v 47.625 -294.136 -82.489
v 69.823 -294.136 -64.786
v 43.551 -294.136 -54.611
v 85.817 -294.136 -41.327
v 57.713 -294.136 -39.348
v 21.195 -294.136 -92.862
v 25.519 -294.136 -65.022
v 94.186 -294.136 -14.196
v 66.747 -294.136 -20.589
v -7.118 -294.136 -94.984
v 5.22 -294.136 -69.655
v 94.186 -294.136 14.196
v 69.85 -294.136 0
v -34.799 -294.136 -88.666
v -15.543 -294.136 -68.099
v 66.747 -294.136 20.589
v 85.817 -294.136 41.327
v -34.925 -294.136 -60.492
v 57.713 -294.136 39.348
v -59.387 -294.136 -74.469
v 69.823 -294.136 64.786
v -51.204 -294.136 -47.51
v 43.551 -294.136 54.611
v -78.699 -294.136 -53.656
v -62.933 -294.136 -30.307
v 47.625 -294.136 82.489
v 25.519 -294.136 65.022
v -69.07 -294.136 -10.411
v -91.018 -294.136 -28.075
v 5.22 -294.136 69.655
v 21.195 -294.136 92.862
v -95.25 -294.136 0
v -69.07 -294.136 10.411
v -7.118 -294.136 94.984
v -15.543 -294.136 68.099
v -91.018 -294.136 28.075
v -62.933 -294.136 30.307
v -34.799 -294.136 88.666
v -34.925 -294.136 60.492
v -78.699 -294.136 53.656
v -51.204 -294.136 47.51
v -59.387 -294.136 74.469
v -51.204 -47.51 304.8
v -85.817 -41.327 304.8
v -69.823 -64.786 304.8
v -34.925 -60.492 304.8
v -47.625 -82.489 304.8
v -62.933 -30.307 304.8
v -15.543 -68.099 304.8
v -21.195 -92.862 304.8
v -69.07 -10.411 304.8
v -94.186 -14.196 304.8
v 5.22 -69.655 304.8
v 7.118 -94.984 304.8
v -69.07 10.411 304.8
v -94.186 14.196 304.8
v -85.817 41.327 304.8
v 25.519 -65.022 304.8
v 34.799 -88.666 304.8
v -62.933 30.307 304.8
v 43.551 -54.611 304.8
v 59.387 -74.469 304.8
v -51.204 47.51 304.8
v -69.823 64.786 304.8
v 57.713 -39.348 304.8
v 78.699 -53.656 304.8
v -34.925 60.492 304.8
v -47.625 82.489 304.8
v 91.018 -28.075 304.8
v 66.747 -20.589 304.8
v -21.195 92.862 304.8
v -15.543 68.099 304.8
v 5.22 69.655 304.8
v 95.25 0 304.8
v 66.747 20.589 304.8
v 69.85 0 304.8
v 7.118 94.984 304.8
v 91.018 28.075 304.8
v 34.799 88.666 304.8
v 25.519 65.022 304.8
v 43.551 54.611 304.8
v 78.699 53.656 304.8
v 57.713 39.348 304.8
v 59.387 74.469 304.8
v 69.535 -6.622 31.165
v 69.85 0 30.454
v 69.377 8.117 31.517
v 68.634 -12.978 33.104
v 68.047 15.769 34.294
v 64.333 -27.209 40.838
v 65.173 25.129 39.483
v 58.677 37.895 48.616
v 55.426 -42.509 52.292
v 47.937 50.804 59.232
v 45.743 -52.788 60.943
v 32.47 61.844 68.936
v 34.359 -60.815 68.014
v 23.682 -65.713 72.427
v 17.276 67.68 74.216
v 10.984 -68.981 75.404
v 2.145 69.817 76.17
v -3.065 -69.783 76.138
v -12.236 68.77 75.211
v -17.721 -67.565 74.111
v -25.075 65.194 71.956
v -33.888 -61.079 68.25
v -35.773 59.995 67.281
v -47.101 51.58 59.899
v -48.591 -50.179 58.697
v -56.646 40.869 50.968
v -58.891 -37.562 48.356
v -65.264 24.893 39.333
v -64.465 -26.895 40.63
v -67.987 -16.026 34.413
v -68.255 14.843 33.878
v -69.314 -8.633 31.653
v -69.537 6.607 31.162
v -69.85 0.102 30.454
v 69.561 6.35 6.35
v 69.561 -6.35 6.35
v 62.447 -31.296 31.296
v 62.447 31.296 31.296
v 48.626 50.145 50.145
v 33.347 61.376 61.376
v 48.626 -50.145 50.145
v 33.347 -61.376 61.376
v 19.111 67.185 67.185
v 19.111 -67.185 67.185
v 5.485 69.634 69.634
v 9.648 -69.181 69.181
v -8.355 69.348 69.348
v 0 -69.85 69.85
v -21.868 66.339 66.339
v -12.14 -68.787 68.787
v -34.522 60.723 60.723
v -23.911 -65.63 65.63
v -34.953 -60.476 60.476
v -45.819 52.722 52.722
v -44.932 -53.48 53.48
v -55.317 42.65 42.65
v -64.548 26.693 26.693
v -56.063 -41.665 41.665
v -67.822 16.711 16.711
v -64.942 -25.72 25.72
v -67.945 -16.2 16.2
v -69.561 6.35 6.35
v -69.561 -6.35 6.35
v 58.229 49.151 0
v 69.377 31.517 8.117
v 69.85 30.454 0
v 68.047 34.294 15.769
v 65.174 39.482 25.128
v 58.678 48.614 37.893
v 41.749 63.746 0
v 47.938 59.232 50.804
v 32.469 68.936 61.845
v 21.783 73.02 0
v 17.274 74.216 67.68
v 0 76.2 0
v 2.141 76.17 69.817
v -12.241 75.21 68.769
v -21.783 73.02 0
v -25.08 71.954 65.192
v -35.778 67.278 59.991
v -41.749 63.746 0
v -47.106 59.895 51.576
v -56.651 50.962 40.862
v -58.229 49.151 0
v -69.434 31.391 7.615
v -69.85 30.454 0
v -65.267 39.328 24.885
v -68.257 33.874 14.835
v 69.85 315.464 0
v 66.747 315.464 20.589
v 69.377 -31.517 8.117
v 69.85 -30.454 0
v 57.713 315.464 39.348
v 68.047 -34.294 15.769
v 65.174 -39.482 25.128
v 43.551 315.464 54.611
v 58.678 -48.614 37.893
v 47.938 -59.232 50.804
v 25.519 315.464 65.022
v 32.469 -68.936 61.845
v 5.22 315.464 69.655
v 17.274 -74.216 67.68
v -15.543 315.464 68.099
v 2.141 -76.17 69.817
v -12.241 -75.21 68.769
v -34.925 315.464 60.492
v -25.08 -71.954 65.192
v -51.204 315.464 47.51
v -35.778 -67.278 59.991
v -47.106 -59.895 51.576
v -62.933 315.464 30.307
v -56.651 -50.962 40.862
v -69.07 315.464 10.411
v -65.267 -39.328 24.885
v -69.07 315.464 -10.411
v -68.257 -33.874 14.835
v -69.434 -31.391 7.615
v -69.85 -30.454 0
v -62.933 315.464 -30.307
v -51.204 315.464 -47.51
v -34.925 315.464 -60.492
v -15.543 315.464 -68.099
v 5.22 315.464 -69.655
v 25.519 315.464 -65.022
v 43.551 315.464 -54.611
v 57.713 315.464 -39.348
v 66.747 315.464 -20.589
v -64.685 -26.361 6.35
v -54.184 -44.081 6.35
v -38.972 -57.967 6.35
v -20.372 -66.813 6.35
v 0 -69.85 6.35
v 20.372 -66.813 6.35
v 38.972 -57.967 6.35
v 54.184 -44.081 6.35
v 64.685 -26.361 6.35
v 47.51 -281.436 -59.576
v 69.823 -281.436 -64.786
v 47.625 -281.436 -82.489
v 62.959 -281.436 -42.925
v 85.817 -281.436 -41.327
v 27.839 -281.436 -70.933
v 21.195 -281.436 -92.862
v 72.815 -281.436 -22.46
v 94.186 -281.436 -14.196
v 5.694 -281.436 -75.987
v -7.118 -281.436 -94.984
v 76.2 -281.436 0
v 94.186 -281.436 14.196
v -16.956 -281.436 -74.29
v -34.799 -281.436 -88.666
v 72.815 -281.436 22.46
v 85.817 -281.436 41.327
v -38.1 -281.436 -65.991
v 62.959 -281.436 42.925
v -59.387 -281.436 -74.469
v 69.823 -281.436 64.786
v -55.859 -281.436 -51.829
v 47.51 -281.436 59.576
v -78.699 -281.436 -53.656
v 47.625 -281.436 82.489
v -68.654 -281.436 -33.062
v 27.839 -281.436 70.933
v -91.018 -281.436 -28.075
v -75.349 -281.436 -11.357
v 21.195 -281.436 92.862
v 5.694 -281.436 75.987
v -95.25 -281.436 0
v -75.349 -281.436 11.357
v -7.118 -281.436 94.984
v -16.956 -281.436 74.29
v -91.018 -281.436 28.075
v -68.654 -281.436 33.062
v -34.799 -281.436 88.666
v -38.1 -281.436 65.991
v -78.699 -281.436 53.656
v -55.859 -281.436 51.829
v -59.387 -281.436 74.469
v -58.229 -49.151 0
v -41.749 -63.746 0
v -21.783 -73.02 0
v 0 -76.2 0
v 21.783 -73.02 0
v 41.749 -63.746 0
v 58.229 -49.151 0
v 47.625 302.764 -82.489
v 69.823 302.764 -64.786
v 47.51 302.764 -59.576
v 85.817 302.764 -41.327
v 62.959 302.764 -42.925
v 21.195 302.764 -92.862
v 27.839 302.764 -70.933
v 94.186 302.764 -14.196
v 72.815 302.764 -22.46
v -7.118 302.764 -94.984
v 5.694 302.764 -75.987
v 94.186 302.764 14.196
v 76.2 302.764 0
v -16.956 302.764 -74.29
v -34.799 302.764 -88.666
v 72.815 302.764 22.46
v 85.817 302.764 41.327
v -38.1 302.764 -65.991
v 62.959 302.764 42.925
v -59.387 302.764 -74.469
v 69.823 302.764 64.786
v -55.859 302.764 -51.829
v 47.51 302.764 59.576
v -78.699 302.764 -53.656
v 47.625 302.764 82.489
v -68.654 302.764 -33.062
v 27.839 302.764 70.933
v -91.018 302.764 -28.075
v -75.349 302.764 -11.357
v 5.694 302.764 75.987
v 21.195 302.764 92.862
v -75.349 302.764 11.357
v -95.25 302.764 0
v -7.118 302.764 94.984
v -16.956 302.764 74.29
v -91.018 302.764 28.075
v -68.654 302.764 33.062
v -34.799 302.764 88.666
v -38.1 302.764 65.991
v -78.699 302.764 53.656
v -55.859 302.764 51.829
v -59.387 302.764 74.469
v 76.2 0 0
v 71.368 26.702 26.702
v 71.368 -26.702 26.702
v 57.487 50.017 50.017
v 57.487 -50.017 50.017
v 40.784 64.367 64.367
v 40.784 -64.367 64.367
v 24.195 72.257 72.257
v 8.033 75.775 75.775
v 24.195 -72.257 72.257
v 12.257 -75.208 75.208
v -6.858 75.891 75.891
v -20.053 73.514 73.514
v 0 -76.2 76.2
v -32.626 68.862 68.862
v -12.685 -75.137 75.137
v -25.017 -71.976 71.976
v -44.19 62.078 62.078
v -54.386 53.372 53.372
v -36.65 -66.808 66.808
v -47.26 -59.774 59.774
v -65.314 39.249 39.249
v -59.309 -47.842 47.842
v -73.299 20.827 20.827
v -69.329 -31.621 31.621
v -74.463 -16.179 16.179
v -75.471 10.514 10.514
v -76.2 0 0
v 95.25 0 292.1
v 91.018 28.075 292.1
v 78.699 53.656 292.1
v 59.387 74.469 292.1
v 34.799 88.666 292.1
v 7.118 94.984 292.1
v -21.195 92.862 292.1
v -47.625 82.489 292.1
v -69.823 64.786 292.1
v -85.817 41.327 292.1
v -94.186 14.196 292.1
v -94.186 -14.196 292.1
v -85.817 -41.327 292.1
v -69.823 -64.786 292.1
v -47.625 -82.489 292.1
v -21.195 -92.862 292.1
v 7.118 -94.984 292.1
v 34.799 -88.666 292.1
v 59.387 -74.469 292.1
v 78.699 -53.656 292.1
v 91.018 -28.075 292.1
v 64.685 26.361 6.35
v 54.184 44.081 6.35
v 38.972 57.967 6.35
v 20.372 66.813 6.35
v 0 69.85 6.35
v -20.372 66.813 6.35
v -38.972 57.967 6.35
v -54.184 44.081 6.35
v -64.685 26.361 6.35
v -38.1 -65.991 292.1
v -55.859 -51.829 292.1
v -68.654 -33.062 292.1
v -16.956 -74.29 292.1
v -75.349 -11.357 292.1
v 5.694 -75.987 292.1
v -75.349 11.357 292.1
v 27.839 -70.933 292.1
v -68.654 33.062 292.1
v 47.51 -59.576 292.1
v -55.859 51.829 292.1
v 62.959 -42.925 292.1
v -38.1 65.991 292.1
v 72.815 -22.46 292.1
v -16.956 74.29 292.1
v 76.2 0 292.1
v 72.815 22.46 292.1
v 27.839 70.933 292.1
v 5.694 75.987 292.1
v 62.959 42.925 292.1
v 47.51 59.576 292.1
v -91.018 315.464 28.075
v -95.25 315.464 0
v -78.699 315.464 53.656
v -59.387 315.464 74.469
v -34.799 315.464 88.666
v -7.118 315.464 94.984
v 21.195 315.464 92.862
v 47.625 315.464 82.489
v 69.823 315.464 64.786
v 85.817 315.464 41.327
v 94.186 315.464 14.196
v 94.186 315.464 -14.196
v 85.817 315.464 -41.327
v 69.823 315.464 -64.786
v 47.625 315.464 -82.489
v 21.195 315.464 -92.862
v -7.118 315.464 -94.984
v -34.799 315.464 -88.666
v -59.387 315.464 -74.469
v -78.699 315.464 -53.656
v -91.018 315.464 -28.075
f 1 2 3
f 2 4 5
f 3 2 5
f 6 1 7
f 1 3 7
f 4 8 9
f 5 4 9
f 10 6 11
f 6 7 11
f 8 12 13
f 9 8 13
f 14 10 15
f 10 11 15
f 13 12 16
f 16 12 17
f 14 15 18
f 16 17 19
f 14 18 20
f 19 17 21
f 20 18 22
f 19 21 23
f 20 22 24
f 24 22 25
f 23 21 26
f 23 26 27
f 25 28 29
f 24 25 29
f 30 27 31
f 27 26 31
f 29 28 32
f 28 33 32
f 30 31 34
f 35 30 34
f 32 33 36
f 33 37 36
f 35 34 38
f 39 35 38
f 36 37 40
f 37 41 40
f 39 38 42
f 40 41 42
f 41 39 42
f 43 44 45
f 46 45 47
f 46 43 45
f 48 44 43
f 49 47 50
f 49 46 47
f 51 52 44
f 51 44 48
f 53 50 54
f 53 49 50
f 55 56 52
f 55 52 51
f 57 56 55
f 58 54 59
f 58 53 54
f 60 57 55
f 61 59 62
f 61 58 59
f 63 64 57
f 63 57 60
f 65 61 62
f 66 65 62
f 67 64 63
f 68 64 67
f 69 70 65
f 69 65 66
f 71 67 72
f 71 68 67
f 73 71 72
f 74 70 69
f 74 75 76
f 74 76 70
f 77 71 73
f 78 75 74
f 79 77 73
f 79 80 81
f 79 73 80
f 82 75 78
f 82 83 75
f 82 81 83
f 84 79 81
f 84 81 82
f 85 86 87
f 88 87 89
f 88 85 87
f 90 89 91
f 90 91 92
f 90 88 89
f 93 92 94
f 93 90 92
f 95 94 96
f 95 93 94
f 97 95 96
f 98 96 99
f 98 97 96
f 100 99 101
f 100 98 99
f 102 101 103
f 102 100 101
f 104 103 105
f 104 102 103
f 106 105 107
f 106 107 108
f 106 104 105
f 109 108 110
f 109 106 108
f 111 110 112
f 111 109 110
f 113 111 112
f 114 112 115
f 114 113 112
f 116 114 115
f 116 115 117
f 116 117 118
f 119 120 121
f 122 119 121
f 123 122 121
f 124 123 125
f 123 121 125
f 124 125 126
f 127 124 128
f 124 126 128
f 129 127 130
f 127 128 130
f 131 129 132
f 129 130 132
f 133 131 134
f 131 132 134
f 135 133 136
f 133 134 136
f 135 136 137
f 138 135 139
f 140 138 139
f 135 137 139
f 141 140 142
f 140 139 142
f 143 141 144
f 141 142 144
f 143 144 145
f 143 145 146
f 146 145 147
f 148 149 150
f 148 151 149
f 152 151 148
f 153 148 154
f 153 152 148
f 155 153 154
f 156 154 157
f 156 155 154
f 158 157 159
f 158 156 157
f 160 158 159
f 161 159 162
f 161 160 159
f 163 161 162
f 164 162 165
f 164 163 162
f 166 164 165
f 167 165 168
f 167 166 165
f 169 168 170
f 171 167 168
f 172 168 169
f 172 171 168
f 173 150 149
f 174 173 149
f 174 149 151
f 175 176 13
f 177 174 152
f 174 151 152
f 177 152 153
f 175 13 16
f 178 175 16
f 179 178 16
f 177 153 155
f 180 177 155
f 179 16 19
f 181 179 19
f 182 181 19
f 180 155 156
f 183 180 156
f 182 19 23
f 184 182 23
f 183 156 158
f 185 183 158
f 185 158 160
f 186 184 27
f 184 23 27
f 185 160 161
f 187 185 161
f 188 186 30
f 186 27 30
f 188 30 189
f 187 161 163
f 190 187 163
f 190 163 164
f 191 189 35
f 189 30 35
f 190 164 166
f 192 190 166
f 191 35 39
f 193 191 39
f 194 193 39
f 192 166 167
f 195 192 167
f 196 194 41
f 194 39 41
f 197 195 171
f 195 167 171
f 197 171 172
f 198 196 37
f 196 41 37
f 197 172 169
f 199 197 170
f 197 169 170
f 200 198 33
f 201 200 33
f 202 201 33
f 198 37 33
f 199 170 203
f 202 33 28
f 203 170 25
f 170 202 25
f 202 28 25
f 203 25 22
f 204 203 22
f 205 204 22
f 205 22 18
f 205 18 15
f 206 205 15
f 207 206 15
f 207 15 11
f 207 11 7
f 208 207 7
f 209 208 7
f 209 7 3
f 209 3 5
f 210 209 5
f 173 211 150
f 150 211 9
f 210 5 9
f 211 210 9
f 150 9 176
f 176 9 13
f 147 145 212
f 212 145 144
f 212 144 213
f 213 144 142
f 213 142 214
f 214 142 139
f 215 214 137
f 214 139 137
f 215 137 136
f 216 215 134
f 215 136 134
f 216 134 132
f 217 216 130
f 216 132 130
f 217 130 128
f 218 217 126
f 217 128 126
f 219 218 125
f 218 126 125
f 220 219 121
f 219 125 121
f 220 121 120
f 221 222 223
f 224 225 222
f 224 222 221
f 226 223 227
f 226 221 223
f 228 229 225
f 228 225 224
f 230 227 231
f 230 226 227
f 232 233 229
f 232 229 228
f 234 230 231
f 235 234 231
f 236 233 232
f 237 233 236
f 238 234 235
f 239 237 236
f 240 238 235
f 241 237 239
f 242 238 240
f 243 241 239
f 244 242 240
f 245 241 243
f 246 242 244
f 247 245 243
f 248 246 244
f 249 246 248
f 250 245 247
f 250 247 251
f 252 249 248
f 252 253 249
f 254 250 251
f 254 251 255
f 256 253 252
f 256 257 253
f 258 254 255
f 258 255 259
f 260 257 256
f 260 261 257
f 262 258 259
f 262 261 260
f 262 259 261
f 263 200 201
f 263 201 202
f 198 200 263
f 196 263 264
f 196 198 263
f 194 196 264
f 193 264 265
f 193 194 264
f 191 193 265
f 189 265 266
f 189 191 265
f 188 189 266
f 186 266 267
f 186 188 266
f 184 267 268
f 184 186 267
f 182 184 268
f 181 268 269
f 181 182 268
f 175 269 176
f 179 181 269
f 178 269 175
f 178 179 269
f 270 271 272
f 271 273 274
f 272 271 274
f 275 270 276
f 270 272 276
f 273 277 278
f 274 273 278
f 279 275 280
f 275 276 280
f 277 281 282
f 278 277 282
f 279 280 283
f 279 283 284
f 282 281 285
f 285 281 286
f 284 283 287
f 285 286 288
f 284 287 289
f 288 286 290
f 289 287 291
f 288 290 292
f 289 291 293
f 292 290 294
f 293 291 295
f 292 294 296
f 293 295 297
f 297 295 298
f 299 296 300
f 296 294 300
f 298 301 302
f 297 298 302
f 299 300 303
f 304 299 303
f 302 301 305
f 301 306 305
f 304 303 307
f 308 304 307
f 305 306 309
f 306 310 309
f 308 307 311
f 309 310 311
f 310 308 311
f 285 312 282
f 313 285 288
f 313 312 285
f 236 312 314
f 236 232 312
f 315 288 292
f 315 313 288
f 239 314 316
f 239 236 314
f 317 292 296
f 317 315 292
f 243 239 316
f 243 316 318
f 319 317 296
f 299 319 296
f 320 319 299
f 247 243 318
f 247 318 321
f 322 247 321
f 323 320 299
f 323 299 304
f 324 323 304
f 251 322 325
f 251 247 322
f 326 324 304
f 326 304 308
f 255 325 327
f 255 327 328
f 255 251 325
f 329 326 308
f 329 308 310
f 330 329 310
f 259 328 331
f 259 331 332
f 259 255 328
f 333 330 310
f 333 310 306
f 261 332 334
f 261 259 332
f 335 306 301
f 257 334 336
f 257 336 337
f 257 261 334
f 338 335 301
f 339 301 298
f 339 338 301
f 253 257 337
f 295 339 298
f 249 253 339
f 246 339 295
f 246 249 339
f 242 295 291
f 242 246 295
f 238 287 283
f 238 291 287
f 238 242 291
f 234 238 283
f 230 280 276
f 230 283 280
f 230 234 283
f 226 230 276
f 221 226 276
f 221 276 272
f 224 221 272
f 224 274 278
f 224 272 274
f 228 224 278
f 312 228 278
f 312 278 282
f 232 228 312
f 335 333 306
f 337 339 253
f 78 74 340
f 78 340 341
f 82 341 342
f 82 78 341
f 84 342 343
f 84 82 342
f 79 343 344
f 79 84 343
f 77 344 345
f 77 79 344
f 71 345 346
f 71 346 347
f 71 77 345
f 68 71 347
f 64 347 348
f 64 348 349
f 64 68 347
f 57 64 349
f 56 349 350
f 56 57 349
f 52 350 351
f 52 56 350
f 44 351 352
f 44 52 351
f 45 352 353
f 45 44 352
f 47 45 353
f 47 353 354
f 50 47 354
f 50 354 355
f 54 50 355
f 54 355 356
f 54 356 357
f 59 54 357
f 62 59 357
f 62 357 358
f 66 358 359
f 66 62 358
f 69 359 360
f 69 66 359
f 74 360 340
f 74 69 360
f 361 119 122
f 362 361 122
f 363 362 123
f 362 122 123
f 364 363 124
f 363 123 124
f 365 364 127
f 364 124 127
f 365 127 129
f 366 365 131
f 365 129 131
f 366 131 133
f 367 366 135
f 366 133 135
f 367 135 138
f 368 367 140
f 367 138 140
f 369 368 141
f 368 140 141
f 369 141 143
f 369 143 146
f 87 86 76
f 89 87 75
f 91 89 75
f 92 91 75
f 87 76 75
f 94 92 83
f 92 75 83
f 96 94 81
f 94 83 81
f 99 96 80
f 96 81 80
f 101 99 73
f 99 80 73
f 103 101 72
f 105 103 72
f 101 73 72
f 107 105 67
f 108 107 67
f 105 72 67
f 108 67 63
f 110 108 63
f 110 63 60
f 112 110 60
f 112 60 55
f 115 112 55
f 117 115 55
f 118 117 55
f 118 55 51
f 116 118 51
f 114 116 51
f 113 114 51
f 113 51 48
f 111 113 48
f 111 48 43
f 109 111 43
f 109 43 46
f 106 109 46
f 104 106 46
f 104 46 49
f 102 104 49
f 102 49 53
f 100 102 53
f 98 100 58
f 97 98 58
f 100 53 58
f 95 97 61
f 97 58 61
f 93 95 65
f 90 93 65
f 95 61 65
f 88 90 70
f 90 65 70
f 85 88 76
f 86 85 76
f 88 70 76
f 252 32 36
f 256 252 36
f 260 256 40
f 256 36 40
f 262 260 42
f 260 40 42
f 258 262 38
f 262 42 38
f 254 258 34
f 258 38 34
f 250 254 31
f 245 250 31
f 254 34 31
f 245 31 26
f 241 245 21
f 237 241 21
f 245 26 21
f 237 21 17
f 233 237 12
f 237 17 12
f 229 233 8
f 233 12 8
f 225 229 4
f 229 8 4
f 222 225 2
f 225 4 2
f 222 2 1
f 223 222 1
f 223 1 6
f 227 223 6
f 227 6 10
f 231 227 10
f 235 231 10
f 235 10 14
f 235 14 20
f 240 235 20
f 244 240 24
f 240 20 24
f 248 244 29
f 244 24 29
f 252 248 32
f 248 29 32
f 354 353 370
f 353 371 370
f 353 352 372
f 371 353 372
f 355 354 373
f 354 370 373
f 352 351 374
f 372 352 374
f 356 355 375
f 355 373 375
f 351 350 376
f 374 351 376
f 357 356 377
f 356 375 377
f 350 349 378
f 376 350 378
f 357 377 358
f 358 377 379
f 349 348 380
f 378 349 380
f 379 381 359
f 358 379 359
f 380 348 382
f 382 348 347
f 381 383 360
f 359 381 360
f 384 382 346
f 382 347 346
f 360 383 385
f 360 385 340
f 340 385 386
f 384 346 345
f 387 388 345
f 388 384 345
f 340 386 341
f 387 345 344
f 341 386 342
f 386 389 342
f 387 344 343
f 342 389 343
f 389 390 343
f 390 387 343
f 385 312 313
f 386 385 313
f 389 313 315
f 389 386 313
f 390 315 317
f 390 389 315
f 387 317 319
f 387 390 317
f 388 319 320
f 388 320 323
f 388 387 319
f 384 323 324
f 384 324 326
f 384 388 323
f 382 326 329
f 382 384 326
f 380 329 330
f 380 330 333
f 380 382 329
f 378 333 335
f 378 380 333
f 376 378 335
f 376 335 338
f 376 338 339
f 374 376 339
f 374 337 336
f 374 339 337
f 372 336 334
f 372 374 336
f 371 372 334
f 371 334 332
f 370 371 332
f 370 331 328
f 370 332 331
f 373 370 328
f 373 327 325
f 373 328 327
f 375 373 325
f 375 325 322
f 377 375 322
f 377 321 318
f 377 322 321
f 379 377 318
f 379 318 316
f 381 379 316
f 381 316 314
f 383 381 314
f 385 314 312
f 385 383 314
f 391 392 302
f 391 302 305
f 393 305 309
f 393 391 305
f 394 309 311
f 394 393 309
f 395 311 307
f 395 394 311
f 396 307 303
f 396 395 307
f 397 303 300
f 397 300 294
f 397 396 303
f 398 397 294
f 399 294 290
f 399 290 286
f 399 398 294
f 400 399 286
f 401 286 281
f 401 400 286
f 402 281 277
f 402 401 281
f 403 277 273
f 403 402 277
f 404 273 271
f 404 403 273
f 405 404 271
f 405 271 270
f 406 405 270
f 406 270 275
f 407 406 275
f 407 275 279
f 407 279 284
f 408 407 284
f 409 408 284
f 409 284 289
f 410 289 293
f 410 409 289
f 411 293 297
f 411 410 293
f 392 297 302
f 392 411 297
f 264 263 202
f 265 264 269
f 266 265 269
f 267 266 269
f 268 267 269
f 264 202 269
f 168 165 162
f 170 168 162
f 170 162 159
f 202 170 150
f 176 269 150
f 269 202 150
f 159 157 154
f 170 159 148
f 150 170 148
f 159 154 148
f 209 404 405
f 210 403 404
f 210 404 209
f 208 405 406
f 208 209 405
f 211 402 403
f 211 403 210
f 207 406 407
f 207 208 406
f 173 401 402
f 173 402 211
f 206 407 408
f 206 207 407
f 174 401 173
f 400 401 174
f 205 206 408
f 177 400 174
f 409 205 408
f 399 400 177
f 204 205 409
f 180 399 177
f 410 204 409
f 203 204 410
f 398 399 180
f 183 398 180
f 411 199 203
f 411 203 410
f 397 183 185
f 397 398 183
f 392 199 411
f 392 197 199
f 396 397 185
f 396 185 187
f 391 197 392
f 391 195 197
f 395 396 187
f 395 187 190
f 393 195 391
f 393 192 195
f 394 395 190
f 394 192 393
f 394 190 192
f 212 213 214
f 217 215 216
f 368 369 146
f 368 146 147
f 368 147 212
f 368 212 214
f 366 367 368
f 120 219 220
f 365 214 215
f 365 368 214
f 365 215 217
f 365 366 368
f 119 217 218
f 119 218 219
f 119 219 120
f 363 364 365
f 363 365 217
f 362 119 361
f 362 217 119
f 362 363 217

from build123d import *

# Parameters (mm, degrees)
F2_R      = 76.2
F5_DEPTH  = 609.6
F4_R      = 76.2
F6_DEPTH  = 304.8
F7_T      = -6.35
F7_2_T    = -6.35
F9_R      = 95.25
F9_R_2    = 76.2
F10_DEPTH = 12.7
F12_R     = 95.25
F12_R_2   = 76.2
F13_DEPTH = 12.7
F14_R     = 95.25
F14_R_2   = 76.2
F15_DEPTH = 12.7


with BuildPart() as f5:
    # F2 (on plane+point) → F5 (new body)
    with BuildSketch(Plane.XZ.offset(294.1361665726)):
        Circle(F2_R)
    extrude(amount=-F5_DEPTH)

    # F7
    f7_openings = [f5.faces().sort_by_distance(p)[0] for p in [
        (0, 315.463833, 0),
        (0, -294.136167, 0),
    ]]
    offset(amount=F7_T, openings=f7_openings)

    # F9 (on line) → F10 (join)
    with BuildSketch(Plane(origin=(0, -294.1361665726, 0), x_dir=(-1, 0, 0), z_dir=(0, 1, 0))):
        Circle(F9_R)
        Circle(F9_R_2, mode=Mode.SUBTRACT)
    extrude(amount=F10_DEPTH)

    # F12 (on line) → F13 (join)
    with BuildSketch(Plane(origin=(0, 315.4638334274, 0), x_dir=(-1, 0, 0), z_dir=(0, 1, 0))):
        Circle(F12_R)
        Circle(F12_R_2, mode=Mode.SUBTRACT)
    extrude(amount=-F13_DEPTH)



with BuildPart() as f6:
    # F4 (on plane+point) → F6 (new body)
    with BuildSketch(Plane.XY.offset(304.8)):
        Circle(F4_R)
    extrude(amount=-F6_DEPTH)

    # F7#2
    f7_2_openings = [f6.faces().sort_by_distance(p)[0] for p in [
        (0, 0, 304.8),
    ]]
    offset(amount=F7_2_T, openings=f7_2_openings)


with BuildPart() as f5_1:
    add(f5.part)

    add(f6.part)  # F15 merges F6
    # F14 (on plane+point) → F15 (join)
    with BuildSketch(Plane.XY.offset(304.8)):
        Circle(F14_R)
        Circle(F14_R_2, mode=Mode.SUBTRACT)
    extrude(amount=-F15_DEPTH)


solid = f5_1.part
